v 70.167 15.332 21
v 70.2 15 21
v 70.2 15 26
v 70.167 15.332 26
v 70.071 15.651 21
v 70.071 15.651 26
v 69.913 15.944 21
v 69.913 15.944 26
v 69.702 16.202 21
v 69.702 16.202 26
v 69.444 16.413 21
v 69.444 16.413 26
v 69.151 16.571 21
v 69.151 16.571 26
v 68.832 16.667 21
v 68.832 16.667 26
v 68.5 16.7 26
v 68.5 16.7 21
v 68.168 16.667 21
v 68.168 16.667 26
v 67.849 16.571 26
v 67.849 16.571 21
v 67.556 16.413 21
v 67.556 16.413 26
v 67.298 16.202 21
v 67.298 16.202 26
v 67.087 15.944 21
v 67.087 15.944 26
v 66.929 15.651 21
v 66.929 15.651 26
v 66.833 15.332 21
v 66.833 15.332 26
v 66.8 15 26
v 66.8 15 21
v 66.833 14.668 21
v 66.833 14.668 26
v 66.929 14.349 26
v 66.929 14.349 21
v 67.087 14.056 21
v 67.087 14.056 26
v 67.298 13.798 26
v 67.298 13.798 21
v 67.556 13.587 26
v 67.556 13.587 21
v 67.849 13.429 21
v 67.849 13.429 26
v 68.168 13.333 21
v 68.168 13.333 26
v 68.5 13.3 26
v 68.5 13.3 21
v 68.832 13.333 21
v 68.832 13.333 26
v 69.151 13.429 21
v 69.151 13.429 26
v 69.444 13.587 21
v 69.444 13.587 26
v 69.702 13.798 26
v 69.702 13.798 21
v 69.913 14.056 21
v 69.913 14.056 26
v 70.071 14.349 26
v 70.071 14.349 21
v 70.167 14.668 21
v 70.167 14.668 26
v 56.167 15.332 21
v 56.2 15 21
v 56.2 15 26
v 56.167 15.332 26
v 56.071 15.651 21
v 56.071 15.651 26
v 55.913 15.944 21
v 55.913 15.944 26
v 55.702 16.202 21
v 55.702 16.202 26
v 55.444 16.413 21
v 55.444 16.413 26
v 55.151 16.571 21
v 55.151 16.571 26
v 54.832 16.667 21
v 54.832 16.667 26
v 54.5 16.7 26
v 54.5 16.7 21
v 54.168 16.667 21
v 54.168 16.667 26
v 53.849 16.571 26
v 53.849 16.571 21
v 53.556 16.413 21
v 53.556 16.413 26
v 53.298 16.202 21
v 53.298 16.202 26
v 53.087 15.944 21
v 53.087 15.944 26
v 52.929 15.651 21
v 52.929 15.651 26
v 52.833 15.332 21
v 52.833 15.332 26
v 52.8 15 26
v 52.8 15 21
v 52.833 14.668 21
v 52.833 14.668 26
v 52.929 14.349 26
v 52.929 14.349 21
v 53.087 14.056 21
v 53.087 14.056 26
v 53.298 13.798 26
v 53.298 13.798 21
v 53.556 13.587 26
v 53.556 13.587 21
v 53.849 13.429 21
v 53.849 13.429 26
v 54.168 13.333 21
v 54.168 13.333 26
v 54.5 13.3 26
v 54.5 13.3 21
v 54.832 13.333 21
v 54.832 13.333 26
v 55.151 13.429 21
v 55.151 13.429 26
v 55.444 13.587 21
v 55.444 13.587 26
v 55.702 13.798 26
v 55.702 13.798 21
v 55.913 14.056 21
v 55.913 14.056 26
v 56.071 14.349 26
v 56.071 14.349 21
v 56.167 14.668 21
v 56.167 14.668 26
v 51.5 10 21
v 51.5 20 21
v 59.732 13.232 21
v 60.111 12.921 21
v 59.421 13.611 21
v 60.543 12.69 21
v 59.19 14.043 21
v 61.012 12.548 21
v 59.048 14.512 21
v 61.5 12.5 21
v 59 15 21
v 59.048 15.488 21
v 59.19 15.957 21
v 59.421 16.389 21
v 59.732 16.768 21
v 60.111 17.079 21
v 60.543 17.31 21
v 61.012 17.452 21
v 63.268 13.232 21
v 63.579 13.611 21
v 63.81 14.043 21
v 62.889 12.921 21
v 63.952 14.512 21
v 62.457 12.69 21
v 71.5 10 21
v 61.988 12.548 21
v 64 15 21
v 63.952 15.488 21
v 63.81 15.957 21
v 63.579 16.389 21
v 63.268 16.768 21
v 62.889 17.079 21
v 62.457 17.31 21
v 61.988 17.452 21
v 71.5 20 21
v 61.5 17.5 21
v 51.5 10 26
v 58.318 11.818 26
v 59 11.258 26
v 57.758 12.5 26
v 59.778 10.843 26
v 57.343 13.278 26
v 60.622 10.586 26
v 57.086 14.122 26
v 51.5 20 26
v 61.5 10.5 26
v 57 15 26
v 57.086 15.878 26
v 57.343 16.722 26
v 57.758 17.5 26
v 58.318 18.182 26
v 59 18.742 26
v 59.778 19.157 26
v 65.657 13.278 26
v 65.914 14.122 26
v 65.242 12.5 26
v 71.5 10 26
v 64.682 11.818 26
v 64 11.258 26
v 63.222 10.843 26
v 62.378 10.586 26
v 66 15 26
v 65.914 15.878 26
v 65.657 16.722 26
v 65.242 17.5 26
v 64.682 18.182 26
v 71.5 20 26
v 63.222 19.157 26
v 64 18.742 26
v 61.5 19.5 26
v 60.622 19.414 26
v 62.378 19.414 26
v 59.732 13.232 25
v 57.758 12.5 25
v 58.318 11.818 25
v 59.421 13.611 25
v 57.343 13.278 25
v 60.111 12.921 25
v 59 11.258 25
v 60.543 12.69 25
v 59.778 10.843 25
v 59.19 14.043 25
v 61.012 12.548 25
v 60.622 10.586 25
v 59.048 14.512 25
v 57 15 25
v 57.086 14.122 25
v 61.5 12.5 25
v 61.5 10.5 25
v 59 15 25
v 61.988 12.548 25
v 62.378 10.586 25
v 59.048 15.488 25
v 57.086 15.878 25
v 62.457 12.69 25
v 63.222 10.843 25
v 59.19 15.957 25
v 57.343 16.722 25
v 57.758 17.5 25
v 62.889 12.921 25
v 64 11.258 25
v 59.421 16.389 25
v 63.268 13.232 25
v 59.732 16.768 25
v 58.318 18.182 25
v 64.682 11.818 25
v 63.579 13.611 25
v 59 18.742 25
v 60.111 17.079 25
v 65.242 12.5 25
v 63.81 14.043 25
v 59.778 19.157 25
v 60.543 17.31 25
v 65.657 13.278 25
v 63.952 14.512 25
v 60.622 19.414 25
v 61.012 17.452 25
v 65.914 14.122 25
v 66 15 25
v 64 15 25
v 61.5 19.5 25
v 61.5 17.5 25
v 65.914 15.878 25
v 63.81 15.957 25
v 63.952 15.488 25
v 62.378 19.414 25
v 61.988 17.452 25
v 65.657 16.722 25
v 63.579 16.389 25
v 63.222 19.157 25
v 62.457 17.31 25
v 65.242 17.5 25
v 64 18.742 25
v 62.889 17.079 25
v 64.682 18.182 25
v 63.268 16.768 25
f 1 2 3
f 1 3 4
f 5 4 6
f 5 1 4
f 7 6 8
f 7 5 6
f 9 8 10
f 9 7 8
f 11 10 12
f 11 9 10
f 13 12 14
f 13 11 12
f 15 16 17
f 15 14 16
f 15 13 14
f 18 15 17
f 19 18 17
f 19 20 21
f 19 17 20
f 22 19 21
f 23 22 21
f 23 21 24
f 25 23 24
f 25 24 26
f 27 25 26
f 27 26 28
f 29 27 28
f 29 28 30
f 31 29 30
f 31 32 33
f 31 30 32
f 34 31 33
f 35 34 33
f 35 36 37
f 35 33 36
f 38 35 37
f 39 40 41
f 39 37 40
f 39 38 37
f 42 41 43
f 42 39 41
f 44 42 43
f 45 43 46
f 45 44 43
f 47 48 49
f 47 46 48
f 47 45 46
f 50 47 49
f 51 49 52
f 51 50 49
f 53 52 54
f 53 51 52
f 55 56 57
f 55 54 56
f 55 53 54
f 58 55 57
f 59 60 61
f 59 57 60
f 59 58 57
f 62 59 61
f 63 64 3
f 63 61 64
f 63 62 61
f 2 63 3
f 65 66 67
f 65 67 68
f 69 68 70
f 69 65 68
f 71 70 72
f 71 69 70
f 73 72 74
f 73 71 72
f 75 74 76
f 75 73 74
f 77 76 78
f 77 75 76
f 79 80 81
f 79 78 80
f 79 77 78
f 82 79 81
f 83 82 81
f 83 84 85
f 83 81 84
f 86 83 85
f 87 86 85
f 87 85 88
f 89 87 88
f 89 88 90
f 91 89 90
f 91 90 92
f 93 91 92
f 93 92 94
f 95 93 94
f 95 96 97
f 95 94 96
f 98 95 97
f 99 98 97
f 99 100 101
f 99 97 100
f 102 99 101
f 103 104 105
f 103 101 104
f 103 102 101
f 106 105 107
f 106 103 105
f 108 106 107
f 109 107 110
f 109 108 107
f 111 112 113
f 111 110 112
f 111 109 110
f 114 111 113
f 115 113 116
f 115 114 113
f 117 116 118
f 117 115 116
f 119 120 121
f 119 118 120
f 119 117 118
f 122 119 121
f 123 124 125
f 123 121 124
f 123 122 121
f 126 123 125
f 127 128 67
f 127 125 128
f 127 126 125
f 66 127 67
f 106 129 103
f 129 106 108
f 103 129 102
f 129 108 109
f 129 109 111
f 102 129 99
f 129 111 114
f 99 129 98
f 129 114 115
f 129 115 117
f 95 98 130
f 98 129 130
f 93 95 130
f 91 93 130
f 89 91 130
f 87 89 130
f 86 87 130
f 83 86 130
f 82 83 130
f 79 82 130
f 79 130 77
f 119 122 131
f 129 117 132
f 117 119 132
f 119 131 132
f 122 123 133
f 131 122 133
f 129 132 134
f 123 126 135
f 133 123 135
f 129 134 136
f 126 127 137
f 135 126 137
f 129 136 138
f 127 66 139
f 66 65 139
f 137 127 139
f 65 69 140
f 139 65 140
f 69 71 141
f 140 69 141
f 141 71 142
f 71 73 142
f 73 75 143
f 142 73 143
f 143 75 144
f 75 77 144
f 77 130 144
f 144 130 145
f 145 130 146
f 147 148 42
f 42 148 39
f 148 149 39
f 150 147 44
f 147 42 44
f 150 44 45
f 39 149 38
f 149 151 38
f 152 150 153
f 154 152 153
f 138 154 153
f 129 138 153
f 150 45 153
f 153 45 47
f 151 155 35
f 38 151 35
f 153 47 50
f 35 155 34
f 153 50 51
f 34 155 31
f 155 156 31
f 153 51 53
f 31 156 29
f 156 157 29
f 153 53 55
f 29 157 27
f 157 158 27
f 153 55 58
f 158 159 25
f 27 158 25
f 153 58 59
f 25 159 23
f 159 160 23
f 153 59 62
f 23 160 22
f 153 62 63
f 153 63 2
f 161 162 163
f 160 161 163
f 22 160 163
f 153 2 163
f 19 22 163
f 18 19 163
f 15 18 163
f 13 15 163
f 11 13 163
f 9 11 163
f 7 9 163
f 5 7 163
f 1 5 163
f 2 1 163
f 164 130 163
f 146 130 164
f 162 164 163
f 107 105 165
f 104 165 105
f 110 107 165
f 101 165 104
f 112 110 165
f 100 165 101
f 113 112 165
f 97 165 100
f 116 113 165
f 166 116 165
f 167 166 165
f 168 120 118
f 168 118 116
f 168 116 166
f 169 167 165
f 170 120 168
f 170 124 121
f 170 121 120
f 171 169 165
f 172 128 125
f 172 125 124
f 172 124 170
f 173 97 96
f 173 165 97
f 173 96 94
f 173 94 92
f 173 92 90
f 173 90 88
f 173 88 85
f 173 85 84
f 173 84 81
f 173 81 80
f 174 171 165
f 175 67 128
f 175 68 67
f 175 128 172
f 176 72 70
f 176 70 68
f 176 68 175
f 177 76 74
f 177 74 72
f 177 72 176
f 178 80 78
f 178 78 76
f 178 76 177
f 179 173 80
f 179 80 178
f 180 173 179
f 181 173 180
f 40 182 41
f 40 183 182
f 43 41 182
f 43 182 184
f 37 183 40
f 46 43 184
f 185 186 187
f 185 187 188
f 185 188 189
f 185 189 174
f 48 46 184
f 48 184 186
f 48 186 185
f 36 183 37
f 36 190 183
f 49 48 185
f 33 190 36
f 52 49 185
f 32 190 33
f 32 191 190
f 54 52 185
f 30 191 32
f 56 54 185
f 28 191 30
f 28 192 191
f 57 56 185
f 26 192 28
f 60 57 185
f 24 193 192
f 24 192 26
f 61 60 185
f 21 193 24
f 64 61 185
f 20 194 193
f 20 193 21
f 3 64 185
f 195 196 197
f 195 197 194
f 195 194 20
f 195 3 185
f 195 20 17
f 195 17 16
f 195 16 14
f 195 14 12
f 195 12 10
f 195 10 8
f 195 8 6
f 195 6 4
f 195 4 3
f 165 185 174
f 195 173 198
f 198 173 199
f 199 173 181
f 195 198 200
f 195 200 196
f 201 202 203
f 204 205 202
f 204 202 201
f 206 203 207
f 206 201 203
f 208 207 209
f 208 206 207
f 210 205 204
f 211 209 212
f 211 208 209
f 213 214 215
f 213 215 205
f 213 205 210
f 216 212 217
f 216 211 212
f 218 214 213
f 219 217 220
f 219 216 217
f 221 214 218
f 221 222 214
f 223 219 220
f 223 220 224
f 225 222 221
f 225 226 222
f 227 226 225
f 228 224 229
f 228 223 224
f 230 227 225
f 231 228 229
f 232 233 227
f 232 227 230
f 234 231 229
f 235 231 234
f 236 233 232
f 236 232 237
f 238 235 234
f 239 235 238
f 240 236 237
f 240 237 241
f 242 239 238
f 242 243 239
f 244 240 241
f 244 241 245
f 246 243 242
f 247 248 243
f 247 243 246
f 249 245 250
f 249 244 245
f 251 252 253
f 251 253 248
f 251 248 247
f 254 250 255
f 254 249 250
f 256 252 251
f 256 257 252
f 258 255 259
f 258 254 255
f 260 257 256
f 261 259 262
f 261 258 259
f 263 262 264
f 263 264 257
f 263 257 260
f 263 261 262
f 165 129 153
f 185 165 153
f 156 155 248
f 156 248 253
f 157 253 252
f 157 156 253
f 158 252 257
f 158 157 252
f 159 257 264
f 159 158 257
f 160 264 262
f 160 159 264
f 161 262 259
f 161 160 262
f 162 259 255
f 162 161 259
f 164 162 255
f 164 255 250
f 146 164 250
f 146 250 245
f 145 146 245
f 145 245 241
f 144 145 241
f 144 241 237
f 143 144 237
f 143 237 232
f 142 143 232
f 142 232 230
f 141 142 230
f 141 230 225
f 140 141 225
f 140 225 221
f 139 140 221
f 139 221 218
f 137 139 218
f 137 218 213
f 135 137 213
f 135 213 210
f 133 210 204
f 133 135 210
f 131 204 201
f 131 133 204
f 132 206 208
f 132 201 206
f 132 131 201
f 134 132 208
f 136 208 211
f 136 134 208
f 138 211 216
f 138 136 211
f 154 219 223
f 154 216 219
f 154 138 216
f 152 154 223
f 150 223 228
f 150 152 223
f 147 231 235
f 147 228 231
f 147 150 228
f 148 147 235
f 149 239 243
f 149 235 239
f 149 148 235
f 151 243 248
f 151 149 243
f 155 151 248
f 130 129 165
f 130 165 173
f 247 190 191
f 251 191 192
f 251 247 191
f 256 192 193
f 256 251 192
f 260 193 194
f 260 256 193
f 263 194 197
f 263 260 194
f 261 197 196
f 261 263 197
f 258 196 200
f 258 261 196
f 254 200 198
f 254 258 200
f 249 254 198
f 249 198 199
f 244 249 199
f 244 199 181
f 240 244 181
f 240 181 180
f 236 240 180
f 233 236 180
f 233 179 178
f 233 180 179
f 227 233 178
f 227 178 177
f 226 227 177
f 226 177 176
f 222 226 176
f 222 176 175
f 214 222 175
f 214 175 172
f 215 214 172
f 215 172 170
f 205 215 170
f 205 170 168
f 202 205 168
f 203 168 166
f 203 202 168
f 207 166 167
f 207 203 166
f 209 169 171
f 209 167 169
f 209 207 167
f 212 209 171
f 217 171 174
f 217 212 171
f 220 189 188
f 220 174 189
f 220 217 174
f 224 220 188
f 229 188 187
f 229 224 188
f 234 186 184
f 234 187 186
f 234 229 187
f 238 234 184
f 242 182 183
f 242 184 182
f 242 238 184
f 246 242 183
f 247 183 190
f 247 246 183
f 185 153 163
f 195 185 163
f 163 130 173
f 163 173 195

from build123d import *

# Parameters (mm, degrees)
CYLINDER065_R     = 1.7
CYLINDER065_DEPTH = 50
CYLINDER066_R     = 1.7
CYLINDER066_DEPTH = 50
CYLINDER063_R     = 2.5
CYLINDER063_DEPTH = 50
CYLINDER064_R     = 4.5
CYLINDER064_DEPTH = 4
BOX039_W          = 20
BOX039_H          = 10
BOX039_DEPTH      = 5


with BuildPart() as m3_studding006:
    # Cylinder065 → Cylinder065 (new body)
    with BuildSketch(Plane(origin=(68.5, 15, 2), x_dir=(1, 0, 0), z_dir=(0, 0, 1))):
        Circle(CYLINDER065_R)
    extrude(amount=CYLINDER065_DEPTH)


with BuildPart() as m3_clearance:
    # Cylinder066 → Cylinder066 (new body)
    with BuildSketch(Plane(origin=(54.5, 15, 2), x_dir=(1, 0, 0), z_dir=(0, 0, 1))):
        Circle(CYLINDER066_R)
    extrude(amount=CYLINDER066_DEPTH)

    # Fusion038: union m3-studding006
    add(m3_studding006.part)


with BuildPart() as nut_clearance:
    # Cylinder063 → Cylinder063 (new body)
    with BuildSketch(Plane(origin=(61.5, 15, 2), x_dir=(1, 0, 0), z_dir=(0, 0, 1))):
        Circle(CYLINDER063_R)
    extrude(amount=CYLINDER063_DEPTH)


with BuildPart() as bearing_nuts001:
    # Cylinder064 → Cylinder064 (new body)
    with BuildSketch(Plane(origin=(61.5, 15, 25), x_dir=(1, 0, 0), z_dir=(0, 0, 1))):
        Circle(CYLINDER064_R)
    extrude(amount=CYLINDER064_DEPTH)

    # Fusion037: union nut-clearance
    add(nut_clearance.part)


with BuildPart() as bearing_cover_b:
    # Box039 → Box039 (new body)
    with BuildSketch(Plane(origin=(51.5, 10, 21), x_dir=(1, 0, 0), z_dir=(0, 0, 1))):
        with Locations((10, 5)):
            Rectangle(BOX039_W, BOX039_H)
    extrude(amount=BOX039_DEPTH)

    # Cut025: cut bearing-nuts001
    add(bearing_nuts001.part, mode=Mode.SUBTRACT)

    # Cut026: cut M3-clearance
    add(m3_clearance.part, mode=Mode.SUBTRACT)


solid = bearing_cover_b.part
